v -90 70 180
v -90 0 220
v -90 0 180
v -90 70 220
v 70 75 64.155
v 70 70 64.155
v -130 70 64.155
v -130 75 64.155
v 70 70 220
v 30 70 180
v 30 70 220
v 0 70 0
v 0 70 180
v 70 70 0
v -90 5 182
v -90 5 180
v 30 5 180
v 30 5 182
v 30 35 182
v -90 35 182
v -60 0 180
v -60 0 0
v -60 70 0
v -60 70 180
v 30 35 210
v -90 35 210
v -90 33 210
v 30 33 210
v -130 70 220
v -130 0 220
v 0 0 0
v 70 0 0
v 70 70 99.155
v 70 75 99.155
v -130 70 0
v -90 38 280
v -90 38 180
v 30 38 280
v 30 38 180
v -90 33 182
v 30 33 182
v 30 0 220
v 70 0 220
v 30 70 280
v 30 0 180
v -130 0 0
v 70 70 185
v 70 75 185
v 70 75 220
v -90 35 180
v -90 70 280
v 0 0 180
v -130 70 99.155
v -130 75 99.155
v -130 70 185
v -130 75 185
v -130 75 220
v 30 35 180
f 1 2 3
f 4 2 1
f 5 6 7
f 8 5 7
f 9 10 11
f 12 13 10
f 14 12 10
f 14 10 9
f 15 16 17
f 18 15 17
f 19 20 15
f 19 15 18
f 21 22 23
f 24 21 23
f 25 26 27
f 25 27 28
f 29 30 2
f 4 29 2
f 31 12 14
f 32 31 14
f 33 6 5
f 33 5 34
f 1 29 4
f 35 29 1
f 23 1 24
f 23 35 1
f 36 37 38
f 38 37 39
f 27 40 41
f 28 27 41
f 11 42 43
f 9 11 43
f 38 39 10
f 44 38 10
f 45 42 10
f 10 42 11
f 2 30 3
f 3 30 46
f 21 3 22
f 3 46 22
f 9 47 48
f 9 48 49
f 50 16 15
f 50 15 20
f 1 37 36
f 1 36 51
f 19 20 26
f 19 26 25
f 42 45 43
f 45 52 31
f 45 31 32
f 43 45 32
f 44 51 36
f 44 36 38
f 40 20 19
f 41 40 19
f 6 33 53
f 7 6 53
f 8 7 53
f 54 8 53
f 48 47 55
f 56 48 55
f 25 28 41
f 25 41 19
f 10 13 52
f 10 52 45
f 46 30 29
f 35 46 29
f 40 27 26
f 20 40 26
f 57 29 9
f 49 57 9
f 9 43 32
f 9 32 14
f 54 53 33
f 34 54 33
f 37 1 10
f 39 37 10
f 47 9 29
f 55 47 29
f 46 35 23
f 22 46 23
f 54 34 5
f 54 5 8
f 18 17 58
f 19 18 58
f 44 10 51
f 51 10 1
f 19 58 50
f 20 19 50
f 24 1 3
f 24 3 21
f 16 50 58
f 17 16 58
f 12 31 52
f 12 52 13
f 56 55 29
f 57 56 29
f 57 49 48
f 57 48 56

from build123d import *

# Parameters (mm, degrees)
F0_W      = 70
F0_H      = 70
F1_DEPTH  = 220
F2_W      = 30
F2_H      = 70
F4_DEPTH  = 40
F3_W      = 30
F3_H      = 70
F5_DEPTH  = 40
F6_W      = 30
F6_H      = 32
F6_W_2    = 90
F7_DEPTH  = 100
F8_W      = 40
F8_H      = 35
F8_W_2    = 160
F9_DEPTH  = 5
F10_W     = 70
F10_H     = 35
F10_W_2   = 130
F11_DEPTH = 5
F12_W     = 90
F12_H     = 30
F12_W_2   = 30
F13_DEPTH = 2
F14_W     = 120
F14_H     = 2
F15_DEPTH = 28


with BuildPart() as f1:
    # F0 (on Top) → F1 (new body)
    with BuildSketch(Plane.XY):
        with Locations((-95, 35)):
            Rectangle(F0_W, F0_H)
        with Locations((35, 35)):
            Rectangle(F0_W, F0_H)
    extrude(amount=F1_DEPTH)

    # F2 (on face) → F4 (cut)
    with BuildSketch(Plane.XY.offset(220)):
        with Locations((-75, 35)):
            Rectangle(F2_W, F2_H)
    extrude(amount=-F4_DEPTH, mode=Mode.SUBTRACT)

    # F3 (on face) → F5 (cut)
    with BuildSketch(Plane.XY.offset(220)):
        with Locations((15, 35)):
            Rectangle(F3_W, F3_H)
    extrude(amount=-F5_DEPTH, mode=Mode.SUBTRACT)


with BuildPart() as f7:
    # F6 (on face) → F7 (new body)
    with BuildSketch(Plane.XY.offset(180)):
        with Locations((-75, 54)):
            Rectangle(F6_W, F6_H)
        with Locations((-15, 54)):
            Rectangle(F6_W_2, F6_H)
    extrude(amount=F7_DEPTH)


with BuildPart() as f9:
    # F8 (on face) → F9 (new body)
    with BuildSketch(Plane(origin=(0, 70, 0), x_dir=(-1, 0, 0), z_dir=(0, 1, 0))):
        with Locations((-50, 202.5)):
            Rectangle(F8_W, F8_H)
        with Locations((50, 202.5)):
            Rectangle(F8_W_2, F8_H)
    extrude(amount=F9_DEPTH)


with BuildPart() as f11:
    # F10 (on face) → F11 (new body)
    with BuildSketch(Plane(origin=(0, 70, 0), x_dir=(-1, 0, 0), z_dir=(0, 1, 0))):
        with Locations((-35, 81.655191)):
            Rectangle(F10_W, F10_H)
        with Locations((65, 81.655191)):
            Rectangle(F10_W_2, F10_H)
    extrude(amount=F11_DEPTH)


with BuildPart() as f13:
    # F12 (on face) → F13 (new body)
    with BuildSketch(Plane.XY.offset(180)):
        with Locations((-45, 20)):
            Rectangle(F12_W, F12_H)
        with Locations((15, 20)):
            Rectangle(F12_W_2, F12_H)
    extrude(amount=F13_DEPTH)


with BuildPart() as f15:
    # F14 (on face) → F15 (new body)
    with BuildSketch(Plane.XY.offset(182)):
        with Locations((-30, 34)):
            Rectangle(F14_W, F14_H)
    extrude(amount=F15_DEPTH)


solid = Compound([f1.part, f7.part, f9.part, f11.part, f13.part, f15.part])
